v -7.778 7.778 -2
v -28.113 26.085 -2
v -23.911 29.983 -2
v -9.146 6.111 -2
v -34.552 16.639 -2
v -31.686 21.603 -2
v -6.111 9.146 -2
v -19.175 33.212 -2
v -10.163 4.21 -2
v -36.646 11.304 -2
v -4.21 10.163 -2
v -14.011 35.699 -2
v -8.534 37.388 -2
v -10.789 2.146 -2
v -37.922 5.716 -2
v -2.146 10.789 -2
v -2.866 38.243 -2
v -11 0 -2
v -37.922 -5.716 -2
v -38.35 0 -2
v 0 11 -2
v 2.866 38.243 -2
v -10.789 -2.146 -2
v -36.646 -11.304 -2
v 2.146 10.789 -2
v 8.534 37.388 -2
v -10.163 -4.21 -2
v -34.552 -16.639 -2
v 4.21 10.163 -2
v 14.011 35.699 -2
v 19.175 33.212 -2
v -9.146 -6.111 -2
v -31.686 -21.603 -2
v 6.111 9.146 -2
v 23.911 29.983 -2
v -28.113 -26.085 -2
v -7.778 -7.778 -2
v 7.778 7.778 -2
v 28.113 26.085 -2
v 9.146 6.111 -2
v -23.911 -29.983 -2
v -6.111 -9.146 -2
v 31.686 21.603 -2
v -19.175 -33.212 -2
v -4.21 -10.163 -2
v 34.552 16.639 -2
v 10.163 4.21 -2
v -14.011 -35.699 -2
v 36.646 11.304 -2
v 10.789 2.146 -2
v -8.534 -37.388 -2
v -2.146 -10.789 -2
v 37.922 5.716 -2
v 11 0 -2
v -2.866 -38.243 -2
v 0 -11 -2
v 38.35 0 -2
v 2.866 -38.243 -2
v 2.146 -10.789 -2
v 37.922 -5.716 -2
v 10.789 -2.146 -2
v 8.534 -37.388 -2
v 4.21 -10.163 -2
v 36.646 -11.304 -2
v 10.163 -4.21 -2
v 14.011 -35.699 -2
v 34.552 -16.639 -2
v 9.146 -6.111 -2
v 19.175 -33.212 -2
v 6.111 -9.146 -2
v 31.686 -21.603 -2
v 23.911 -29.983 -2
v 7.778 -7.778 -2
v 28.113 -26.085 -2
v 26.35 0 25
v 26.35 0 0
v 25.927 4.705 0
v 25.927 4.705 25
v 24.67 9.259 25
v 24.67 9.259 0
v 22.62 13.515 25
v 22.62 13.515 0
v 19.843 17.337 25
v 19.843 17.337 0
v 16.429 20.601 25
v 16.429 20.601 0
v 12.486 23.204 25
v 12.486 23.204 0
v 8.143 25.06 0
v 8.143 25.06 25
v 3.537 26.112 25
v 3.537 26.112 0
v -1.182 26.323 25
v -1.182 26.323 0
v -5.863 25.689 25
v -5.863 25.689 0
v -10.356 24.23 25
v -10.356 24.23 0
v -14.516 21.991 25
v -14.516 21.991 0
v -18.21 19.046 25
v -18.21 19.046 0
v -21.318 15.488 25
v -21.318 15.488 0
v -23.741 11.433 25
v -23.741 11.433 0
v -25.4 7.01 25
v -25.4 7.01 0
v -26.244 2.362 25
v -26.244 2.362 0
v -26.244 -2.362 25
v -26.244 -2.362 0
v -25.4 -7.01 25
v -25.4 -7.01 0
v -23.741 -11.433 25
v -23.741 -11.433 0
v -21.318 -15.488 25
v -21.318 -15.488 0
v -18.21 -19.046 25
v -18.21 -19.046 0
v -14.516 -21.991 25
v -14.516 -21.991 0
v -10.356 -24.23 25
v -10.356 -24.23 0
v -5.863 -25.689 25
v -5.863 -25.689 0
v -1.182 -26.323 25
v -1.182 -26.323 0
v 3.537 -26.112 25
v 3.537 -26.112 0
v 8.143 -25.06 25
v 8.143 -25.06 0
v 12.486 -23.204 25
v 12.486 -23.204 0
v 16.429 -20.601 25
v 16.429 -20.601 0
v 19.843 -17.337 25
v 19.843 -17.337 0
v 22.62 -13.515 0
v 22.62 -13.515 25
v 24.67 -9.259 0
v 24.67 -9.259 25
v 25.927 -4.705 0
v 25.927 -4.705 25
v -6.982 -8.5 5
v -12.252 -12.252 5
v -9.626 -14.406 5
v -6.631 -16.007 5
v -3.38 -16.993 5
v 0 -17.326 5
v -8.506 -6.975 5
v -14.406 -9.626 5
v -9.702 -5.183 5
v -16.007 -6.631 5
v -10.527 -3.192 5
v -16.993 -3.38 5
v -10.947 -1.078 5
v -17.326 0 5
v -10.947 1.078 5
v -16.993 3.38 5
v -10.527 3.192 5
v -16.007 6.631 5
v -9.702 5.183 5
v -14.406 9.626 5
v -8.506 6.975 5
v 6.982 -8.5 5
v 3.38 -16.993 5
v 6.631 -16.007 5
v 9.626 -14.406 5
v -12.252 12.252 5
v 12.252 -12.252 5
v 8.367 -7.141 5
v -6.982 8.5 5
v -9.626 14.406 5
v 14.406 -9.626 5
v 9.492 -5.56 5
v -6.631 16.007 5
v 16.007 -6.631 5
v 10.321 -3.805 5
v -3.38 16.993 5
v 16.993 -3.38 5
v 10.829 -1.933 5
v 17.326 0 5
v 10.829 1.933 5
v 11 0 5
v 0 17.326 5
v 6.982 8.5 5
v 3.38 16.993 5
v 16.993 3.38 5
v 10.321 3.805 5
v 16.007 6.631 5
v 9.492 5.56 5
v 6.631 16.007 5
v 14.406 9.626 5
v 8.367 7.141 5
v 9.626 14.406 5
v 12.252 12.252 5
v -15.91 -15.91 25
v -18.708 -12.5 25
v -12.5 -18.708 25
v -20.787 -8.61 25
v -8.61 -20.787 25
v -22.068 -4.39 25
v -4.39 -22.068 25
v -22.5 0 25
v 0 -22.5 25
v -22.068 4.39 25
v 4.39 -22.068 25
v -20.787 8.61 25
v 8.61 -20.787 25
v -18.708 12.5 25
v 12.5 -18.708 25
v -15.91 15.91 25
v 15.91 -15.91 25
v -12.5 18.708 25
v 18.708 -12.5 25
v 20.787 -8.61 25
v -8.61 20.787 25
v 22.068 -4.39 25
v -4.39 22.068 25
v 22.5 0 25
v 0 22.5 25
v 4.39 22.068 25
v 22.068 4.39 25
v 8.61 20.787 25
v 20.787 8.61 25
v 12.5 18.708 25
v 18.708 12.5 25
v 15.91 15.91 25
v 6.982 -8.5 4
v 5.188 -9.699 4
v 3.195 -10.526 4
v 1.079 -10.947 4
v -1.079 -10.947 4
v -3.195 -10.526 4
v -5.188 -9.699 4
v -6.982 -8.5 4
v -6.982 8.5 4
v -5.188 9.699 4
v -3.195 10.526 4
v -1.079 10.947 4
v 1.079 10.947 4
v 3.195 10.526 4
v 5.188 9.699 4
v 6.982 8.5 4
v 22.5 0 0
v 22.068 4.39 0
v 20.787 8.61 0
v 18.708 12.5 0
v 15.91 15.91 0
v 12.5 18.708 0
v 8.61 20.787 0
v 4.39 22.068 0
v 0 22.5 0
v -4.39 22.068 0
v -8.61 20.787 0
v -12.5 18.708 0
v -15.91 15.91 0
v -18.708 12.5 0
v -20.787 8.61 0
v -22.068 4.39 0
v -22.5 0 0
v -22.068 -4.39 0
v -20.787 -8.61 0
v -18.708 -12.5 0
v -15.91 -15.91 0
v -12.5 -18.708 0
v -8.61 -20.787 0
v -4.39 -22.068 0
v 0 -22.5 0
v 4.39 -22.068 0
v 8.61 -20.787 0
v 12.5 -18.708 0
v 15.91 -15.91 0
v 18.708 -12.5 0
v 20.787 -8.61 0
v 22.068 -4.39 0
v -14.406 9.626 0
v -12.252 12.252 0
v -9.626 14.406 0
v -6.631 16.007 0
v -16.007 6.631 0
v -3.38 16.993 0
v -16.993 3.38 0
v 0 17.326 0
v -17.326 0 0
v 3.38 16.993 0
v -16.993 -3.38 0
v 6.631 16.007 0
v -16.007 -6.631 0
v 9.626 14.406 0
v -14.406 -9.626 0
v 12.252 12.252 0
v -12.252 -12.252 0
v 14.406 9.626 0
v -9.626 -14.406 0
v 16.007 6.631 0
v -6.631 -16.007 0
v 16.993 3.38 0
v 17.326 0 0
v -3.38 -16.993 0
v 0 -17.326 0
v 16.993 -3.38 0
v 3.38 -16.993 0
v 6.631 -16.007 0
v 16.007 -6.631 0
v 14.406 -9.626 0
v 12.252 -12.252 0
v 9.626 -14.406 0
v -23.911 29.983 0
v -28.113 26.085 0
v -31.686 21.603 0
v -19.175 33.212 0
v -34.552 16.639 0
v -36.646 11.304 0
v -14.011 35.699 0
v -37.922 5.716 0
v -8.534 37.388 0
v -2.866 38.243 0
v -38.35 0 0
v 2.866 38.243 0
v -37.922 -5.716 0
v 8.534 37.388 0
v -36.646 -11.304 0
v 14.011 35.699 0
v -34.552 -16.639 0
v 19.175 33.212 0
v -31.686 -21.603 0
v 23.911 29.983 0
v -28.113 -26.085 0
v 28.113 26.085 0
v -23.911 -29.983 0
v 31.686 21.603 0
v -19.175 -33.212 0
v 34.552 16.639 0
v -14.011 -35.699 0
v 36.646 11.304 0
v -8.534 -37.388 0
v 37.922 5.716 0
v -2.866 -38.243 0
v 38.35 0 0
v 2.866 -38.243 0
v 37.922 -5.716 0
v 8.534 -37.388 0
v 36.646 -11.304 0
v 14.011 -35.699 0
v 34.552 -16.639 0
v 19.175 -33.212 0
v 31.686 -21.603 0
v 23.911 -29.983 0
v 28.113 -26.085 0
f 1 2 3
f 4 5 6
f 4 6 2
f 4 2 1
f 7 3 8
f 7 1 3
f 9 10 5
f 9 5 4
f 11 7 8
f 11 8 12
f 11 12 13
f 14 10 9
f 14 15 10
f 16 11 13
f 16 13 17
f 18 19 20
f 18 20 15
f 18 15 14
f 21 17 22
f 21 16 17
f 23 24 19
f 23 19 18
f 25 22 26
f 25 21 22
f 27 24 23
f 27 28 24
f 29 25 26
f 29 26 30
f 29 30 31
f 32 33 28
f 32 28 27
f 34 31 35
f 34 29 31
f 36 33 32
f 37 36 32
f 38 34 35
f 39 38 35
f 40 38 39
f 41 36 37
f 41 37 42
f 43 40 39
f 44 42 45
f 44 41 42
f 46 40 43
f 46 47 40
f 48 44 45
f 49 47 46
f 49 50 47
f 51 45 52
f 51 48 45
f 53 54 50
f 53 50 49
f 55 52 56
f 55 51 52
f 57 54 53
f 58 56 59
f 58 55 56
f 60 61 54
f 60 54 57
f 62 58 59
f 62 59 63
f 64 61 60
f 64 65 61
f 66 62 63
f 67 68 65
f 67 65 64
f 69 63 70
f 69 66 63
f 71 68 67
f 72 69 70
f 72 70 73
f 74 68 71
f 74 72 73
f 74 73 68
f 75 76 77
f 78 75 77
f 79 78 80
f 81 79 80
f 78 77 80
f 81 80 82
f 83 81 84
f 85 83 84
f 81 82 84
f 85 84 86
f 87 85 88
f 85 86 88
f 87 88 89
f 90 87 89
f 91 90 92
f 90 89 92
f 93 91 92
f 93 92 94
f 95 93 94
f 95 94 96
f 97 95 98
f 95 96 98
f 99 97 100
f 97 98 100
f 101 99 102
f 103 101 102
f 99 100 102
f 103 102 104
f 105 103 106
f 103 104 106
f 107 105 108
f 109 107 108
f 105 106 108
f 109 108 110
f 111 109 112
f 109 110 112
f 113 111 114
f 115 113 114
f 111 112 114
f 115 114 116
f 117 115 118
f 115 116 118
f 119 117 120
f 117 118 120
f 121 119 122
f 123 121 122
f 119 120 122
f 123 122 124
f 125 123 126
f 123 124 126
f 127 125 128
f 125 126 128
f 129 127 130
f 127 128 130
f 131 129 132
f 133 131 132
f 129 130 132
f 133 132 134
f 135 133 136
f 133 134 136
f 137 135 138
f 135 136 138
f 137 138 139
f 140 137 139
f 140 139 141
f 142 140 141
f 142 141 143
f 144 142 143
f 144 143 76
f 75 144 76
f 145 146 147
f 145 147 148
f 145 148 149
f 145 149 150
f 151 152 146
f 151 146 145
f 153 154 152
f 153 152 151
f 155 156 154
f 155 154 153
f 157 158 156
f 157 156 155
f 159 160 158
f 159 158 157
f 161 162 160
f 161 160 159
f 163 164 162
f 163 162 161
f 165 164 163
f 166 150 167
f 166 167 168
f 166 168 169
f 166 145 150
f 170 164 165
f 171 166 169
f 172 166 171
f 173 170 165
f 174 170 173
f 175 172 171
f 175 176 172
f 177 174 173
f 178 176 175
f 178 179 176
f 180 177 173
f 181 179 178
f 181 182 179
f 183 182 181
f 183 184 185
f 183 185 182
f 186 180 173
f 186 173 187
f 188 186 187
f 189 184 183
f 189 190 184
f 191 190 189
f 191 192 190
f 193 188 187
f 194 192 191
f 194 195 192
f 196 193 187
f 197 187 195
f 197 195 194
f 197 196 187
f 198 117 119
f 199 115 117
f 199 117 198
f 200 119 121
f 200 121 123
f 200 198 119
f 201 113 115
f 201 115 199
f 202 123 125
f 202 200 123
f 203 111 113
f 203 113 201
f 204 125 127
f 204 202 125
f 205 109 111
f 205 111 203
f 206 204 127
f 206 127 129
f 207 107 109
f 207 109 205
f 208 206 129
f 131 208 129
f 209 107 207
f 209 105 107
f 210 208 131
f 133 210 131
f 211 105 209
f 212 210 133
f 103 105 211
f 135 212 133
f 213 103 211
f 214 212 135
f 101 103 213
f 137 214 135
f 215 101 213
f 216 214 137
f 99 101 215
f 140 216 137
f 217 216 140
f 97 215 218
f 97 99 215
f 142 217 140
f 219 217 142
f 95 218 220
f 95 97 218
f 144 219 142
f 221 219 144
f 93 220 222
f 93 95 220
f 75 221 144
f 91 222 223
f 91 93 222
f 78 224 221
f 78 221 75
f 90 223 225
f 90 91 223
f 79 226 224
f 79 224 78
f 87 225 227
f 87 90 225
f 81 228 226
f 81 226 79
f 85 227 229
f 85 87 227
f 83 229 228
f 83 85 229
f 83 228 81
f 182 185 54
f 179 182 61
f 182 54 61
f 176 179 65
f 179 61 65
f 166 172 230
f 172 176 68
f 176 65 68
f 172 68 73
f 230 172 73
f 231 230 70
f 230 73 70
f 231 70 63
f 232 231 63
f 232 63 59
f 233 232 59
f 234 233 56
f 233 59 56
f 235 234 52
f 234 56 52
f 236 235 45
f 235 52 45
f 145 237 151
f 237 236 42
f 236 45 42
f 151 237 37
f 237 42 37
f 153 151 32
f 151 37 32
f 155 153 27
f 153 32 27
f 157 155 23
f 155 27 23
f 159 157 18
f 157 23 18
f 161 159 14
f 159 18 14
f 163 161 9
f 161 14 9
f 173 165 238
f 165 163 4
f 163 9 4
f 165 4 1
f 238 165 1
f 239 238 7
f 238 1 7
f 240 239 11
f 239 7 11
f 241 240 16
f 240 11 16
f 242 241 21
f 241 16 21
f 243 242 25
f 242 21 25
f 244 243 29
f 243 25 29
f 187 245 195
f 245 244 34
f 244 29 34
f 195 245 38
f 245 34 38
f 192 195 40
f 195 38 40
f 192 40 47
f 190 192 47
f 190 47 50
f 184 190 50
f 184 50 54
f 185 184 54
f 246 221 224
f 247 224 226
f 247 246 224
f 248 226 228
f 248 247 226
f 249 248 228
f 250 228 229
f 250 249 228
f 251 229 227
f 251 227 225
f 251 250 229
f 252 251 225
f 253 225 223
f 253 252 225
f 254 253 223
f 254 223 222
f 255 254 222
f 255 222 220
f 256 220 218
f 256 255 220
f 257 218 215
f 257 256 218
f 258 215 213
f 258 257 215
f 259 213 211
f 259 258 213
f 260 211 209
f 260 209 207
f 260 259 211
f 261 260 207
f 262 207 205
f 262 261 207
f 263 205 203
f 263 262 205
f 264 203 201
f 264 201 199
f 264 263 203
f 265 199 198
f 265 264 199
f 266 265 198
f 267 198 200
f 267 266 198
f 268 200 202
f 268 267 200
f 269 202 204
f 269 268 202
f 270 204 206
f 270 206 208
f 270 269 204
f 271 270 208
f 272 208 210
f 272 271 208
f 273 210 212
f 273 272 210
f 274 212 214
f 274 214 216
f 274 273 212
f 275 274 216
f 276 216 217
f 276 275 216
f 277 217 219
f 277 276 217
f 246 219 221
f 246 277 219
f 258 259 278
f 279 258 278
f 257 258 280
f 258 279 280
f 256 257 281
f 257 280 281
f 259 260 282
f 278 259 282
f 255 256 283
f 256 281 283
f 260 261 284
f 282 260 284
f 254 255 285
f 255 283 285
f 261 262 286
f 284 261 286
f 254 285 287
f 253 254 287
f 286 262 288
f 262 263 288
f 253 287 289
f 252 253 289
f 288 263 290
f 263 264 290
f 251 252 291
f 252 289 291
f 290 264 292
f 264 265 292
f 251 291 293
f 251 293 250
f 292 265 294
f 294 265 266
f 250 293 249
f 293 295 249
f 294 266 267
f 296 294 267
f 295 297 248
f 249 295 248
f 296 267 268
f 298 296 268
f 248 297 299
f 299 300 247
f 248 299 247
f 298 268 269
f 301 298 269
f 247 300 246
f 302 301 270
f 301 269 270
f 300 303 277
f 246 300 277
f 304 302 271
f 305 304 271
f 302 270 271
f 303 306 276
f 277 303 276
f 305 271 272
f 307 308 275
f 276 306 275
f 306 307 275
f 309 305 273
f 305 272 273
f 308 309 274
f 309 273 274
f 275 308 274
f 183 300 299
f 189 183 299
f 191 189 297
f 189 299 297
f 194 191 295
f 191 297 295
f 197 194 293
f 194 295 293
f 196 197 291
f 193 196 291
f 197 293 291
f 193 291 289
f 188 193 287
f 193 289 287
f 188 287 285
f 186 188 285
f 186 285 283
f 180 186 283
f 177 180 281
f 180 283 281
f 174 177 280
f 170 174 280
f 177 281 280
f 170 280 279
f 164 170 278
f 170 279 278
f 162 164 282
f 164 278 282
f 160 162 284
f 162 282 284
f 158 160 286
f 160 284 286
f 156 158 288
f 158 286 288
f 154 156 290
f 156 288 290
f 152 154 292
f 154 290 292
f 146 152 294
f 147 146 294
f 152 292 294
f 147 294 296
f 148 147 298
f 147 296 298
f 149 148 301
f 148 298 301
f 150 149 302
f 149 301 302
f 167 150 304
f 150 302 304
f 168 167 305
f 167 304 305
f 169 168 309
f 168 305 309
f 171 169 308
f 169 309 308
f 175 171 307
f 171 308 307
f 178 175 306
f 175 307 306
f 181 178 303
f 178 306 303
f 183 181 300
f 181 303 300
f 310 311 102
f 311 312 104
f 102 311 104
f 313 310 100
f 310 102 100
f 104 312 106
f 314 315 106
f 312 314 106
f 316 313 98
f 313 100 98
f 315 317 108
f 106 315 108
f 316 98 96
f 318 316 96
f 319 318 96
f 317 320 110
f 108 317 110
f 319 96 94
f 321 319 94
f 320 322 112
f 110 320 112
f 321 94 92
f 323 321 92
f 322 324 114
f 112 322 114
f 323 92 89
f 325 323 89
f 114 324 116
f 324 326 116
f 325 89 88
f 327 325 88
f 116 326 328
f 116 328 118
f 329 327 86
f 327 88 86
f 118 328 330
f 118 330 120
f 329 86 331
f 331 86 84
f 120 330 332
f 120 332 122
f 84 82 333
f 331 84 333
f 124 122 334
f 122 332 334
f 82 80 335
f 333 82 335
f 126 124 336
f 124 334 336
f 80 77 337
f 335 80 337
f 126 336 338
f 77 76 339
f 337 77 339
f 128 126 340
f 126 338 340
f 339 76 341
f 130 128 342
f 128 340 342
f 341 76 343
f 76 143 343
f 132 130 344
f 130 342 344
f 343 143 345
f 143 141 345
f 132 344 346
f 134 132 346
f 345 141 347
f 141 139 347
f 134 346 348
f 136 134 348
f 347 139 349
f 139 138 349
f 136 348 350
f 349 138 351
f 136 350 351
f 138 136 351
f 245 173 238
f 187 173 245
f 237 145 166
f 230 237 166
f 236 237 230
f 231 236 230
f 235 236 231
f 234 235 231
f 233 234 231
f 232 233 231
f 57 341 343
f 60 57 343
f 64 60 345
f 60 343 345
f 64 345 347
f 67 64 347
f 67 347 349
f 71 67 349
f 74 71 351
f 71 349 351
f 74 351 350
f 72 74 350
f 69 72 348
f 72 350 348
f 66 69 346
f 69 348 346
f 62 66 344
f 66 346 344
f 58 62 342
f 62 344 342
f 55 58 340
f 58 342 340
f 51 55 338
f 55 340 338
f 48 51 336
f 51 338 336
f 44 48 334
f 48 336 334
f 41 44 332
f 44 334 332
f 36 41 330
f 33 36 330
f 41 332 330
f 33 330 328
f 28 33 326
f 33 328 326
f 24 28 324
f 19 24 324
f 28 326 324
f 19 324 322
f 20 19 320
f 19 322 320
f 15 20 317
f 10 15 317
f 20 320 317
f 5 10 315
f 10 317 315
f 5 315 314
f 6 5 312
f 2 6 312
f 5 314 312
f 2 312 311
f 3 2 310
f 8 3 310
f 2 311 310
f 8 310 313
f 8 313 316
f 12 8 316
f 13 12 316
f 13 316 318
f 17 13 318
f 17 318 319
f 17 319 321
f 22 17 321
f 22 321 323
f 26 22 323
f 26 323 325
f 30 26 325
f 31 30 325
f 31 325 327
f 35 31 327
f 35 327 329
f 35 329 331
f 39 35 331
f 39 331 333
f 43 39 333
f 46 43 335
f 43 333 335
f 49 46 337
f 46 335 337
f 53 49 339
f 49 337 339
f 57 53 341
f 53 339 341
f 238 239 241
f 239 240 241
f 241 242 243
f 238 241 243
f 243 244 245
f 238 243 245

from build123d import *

# Parameters (mm, degrees)
F0_R      = 26.35
F0_R_2    = 22.5
F1_DEPTH  = 25
F2_R      = 38.35
F2_R_2    = 26.35
F2_R_3    = 22.5
F3_DEPTH  = 2
F4_R      = 11
F5_DEPTH  = 25
F6_R      = 17.3263528998
F7_DEPTH  = 5
F8_R      = 11
F9_DEPTH  = 25
F10_W     = 19.7272742478
F10_H     = 3
F10_W_2   = 21.5454568693
F11_DEPTH = 1


with BuildPart() as f1:
    # F0 (on Top) → F1 (new body)
    with BuildSketch(Plane.XY):
        Circle(F0_R)
        Circle(F0_R_2, mode=Mode.SUBTRACT)
    extrude(amount=F1_DEPTH)

    # F2 (on face) → F3 (join)
    with BuildSketch(Plane(origin=(0, 0, 0), x_dir=(1, 0, 0), z_dir=(0, 0, -1))):
        Circle(F2_R)
        Circle(F2_R_2, mode=Mode.SUBTRACT)
        Circle(F2_R_2)
        Circle(F2_R_3, mode=Mode.SUBTRACT)
        Circle(F2_R_3)
    extrude(amount=F3_DEPTH)

    # F4 (on face) → F5 (cut)
    with BuildSketch(Plane(origin=(0, 0, -2), x_dir=(1, 0, 0), z_dir=(0, 0, -1))):
        Circle(F4_R)
    extrude(amount=-F5_DEPTH, mode=Mode.SUBTRACT)

    # F6 (on face) → F7 (join)
    with BuildSketch(Plane.XY):
        Circle(F6_R)
    extrude(amount=F7_DEPTH)

    # F8 (on face) → F9 (cut)
    with BuildSketch(Plane(origin=(0, 0, 0), x_dir=(1, 0, 0), z_dir=(0, 0, -1))):
        Circle(F8_R)
    extrude(amount=-F9_DEPTH, mode=Mode.SUBTRACT)

    # F10 (on face) → F11 (join)
    with BuildSketch(Plane.XY.offset(5)):
        with Locations((0.8293200467, 10)):
            Rectangle(F10_W, F10_H)
        with Locations((0.4202285782, -10)):
            Rectangle(F10_W_2, F10_H)
    extrude(amount=-F11_DEPTH)


solid = f1.part
